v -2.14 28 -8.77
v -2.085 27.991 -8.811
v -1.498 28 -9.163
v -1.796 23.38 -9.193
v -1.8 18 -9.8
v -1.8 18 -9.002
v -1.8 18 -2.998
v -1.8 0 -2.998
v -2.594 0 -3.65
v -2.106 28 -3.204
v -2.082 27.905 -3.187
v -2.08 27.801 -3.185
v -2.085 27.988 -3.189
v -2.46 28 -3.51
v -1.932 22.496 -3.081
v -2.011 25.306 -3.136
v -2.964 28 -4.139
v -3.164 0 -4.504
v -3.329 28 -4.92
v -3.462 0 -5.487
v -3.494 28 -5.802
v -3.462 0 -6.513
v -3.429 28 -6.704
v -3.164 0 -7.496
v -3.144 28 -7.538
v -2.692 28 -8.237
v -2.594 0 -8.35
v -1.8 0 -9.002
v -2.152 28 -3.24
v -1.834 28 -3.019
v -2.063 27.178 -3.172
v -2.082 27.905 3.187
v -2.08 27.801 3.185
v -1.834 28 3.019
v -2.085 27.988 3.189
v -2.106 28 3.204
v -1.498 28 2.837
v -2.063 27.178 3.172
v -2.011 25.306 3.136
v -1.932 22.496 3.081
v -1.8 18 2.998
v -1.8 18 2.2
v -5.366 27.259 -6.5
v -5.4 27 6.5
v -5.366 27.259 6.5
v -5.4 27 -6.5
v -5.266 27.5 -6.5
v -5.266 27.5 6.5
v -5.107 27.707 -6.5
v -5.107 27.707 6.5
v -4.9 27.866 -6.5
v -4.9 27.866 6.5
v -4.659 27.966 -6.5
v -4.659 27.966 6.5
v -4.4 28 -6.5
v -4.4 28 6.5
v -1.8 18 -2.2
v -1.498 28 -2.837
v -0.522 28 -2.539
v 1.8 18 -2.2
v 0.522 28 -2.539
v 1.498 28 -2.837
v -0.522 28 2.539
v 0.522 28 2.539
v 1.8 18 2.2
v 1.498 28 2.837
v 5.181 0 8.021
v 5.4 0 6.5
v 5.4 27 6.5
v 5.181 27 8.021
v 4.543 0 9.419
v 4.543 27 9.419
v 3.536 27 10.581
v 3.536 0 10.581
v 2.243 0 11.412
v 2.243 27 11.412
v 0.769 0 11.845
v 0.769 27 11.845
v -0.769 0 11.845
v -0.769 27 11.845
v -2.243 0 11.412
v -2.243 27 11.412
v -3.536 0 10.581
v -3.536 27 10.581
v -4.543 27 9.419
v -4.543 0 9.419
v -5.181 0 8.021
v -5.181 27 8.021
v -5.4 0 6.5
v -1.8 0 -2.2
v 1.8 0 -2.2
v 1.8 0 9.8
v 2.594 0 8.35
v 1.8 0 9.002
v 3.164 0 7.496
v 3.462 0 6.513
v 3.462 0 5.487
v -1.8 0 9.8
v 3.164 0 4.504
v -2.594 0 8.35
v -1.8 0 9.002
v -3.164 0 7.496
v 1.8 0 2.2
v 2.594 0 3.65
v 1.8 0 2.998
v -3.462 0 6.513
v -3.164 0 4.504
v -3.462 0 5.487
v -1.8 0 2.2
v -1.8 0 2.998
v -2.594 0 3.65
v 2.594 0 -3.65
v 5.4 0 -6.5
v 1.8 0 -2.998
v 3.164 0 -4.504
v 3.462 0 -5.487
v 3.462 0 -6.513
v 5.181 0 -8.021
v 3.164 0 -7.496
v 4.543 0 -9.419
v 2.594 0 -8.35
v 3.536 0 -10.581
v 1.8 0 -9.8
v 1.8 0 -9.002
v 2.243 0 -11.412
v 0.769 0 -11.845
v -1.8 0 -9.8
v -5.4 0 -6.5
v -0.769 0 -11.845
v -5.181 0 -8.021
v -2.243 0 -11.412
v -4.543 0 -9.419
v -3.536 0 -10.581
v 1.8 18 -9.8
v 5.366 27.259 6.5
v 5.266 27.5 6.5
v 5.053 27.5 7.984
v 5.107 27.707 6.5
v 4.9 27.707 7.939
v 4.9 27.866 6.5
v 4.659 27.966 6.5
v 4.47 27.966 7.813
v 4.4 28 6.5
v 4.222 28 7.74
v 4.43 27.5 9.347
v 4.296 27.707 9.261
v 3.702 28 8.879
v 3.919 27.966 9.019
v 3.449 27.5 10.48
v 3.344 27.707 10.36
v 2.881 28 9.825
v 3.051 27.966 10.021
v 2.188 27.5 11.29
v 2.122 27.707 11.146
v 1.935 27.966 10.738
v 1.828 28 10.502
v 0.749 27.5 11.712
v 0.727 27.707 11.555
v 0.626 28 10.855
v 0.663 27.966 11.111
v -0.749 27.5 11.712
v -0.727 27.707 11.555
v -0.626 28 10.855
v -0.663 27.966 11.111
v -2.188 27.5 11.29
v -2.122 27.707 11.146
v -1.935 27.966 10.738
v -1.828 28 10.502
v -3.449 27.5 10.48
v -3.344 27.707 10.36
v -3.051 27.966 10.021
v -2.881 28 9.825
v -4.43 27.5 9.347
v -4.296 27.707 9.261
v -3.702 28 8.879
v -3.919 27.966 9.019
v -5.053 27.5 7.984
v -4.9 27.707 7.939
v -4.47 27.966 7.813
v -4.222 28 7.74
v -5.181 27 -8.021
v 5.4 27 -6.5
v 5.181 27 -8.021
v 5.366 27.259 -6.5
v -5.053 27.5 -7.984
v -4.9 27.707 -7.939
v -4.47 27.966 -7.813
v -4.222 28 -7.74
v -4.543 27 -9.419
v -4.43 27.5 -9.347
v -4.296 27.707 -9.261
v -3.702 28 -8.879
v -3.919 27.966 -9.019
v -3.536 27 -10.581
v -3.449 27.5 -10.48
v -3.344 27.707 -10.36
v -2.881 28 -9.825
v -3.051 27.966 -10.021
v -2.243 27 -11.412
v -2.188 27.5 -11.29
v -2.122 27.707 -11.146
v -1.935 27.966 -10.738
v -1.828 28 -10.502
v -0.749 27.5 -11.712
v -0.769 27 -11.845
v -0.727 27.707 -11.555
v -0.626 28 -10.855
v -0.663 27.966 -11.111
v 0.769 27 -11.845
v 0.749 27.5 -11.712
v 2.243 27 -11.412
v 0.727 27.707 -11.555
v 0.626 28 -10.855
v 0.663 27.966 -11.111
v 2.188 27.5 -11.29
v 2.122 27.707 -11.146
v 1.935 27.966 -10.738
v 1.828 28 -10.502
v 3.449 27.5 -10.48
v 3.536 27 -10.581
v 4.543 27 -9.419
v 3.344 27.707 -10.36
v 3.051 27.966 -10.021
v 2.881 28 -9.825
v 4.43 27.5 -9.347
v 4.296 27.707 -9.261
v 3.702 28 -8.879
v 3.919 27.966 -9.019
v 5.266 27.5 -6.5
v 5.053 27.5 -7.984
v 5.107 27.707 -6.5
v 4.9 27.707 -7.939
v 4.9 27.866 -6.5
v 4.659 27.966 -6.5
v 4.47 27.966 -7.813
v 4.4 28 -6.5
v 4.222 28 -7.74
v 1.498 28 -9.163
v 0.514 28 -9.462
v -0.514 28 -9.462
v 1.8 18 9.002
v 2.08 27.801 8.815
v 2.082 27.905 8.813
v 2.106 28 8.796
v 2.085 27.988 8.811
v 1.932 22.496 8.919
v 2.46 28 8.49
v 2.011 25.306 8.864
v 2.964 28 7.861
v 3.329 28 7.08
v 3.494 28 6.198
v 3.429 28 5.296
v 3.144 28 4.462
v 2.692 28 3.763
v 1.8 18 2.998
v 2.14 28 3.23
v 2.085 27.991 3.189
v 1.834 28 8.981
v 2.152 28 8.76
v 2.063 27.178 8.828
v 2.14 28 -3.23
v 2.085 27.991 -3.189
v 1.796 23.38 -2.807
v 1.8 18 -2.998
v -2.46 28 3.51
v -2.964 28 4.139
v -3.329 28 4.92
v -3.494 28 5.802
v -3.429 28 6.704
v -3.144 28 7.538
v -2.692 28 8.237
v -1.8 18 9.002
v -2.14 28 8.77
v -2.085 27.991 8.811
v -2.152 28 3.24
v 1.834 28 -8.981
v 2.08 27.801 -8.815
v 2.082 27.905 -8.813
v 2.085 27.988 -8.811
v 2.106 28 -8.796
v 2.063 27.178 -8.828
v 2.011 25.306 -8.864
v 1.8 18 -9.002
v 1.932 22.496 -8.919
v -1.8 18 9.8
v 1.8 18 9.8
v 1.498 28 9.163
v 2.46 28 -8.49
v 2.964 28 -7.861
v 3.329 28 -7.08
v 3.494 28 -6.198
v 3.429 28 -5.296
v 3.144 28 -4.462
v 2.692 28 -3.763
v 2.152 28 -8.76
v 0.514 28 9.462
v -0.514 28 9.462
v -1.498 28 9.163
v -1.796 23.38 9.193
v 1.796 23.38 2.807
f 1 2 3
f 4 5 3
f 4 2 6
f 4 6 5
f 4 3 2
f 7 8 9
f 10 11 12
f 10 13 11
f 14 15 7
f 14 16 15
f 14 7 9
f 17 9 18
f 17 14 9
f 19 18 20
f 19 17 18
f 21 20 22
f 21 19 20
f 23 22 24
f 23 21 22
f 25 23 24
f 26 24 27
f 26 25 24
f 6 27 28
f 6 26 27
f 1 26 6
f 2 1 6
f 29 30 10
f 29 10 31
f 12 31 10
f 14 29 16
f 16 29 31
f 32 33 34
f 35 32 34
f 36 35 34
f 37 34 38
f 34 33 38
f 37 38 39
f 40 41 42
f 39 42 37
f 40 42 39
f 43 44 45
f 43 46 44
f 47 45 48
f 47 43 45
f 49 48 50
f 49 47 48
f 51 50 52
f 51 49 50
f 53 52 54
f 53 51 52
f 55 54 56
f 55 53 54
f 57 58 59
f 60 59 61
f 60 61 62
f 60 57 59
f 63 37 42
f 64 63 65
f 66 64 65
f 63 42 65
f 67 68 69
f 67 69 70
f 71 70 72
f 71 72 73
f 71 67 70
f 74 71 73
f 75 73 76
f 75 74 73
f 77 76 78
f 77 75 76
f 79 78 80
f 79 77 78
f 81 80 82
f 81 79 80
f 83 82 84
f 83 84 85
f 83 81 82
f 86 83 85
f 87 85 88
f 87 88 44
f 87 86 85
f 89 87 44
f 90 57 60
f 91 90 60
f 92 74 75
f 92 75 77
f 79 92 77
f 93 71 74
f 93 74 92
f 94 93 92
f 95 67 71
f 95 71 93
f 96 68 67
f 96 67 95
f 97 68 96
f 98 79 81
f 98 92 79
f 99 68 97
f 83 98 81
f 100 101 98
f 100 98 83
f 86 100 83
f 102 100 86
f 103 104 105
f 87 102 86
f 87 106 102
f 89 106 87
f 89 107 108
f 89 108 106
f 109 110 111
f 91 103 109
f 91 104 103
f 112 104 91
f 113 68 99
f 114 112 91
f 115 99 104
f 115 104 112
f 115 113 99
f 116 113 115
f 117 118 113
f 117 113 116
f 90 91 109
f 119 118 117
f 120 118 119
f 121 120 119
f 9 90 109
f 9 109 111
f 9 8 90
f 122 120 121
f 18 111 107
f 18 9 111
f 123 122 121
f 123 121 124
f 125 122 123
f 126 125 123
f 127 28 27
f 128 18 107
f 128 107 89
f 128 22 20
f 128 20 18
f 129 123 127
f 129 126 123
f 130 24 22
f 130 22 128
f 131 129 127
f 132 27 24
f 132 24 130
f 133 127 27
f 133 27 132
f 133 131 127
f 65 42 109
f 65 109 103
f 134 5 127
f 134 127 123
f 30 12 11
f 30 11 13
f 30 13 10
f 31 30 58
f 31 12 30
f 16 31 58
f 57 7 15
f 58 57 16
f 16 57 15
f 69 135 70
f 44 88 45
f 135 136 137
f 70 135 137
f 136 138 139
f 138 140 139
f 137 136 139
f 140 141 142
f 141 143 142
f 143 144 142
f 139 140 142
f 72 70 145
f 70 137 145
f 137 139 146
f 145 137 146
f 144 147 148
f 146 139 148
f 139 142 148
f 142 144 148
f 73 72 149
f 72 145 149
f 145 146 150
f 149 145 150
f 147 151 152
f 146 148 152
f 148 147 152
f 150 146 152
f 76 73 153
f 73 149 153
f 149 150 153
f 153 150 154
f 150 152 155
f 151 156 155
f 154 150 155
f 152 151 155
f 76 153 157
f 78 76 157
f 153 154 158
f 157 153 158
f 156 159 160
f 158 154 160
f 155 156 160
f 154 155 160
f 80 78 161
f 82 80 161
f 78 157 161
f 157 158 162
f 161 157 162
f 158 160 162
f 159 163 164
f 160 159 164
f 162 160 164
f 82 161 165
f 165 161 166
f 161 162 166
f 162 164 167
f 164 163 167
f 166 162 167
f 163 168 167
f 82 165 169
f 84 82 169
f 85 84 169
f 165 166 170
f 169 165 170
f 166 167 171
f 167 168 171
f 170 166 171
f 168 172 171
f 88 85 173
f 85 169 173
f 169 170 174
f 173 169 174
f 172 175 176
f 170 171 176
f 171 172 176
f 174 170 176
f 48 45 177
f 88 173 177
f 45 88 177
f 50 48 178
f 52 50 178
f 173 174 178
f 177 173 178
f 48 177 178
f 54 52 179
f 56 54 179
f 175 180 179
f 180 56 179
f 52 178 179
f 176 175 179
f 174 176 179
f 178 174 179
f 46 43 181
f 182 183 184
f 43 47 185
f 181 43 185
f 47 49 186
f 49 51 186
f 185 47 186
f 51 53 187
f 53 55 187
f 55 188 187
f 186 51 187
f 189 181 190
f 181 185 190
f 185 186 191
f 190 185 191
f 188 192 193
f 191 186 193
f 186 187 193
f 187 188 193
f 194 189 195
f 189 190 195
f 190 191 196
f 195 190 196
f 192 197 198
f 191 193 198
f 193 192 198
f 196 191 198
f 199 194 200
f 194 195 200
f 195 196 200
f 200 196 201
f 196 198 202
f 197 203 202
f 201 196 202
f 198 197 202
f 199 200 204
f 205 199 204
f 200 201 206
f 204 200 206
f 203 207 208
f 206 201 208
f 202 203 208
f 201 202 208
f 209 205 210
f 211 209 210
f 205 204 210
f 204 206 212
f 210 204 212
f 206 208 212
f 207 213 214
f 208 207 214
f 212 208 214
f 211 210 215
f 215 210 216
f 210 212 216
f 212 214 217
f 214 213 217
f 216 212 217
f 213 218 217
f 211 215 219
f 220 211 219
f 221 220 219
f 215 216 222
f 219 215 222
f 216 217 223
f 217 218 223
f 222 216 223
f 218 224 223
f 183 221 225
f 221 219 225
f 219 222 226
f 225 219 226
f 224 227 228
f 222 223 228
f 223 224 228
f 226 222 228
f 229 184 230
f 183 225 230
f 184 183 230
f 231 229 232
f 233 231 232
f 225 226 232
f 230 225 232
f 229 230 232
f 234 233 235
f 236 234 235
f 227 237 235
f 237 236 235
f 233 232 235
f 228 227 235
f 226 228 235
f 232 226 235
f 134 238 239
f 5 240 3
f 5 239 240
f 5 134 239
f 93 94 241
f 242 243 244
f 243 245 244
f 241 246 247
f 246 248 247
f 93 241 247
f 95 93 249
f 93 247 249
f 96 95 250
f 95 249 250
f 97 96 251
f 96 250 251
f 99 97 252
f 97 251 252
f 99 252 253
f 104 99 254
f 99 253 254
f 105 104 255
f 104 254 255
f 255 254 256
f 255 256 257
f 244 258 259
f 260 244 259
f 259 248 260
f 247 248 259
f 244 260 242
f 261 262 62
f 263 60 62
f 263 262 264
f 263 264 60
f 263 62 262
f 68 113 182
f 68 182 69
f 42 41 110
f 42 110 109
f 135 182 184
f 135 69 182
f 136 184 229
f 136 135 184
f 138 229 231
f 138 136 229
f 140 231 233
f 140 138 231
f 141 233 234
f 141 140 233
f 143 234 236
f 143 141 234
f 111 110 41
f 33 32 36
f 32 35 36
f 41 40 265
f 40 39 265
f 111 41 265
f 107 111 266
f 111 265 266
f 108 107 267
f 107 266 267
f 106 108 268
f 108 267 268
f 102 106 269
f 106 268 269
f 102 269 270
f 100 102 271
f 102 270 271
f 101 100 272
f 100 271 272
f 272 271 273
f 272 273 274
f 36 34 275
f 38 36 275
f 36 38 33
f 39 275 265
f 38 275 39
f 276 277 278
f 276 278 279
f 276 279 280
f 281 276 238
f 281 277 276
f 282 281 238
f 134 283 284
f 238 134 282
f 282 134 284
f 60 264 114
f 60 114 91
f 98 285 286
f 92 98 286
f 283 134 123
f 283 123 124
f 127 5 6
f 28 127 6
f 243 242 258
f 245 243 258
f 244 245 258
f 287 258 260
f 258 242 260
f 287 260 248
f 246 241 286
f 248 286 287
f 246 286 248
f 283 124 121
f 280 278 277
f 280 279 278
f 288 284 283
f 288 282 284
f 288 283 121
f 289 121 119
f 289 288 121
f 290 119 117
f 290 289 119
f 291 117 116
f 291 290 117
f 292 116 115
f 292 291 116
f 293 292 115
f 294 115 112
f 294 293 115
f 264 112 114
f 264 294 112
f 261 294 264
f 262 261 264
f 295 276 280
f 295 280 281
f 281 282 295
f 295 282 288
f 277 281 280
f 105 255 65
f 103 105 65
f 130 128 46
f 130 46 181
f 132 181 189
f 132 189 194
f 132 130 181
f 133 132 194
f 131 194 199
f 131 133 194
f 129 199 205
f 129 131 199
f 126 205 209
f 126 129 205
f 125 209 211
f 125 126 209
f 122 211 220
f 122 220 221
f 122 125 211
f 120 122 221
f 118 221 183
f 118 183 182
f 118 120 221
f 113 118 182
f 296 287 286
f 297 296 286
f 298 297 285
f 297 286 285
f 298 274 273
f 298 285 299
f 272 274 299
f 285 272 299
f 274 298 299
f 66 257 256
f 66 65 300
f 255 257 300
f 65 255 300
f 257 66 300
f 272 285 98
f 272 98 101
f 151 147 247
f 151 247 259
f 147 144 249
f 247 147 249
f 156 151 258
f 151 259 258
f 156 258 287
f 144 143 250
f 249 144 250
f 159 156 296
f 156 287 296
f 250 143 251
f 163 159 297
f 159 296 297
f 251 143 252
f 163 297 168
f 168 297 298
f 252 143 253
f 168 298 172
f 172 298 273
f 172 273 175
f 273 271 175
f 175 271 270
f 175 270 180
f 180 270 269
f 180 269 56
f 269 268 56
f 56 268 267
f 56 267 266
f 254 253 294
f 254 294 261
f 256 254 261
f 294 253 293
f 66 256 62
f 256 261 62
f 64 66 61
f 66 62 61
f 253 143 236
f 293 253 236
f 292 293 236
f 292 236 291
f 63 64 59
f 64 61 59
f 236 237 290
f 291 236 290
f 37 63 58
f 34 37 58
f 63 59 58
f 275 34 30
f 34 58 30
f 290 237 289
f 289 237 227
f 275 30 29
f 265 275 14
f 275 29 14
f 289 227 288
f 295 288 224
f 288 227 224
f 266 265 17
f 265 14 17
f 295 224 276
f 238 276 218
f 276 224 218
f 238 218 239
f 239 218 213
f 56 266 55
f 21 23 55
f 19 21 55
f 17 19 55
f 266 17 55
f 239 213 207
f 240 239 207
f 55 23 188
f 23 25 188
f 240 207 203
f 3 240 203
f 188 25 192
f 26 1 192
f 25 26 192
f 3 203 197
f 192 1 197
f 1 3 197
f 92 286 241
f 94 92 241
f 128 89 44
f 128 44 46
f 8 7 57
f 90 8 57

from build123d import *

# Parameters (mm, degrees)
BOSS_EXTRU_1_DEPTH      = 28
CONG_2_R                = 1
ESQUISSE3_R             = 3.5
ENL_V_MAT_EXTRU_3_DEPTH = 31.8993528
ESQUISSE6_W             = 3.6
ESQUISSE6_H             = 7.6
ENL_V_MAT_EXTRU_4_DEPTH = 23.243426154


with BuildPart() as part:
    # Esquisse1 → Boss.-Extru.1 (new body)
    with BuildSketch(Plane(origin=(0, 0, 0), x_dir=(1, 0, 0), z_dir=(0, 1, 0))):
        with BuildLine():
            Line((5.4, 6.5), (5.4, -6.5))
            ThreePointArc((5.4, -6.5), (0, -11.9), (-5.4, -6.5))
            Line((-5.4, -6.5), (-5.4, 6.5))
            ThreePointArc((-5.4, 6.5), (0, 11.9), (5.4, 6.5))
        make_face()
    extrude(amount=BOSS_EXTRU_1_DEPTH)

    # Congé2
    cong_2_edges = [part.edges().sort_by_distance(p)[0] for p in [
        (0, 28, 11.9),
        (5.4, 28, 0),
        (0, 28, -11.9),
        (-5.4, 28, 0),
    ]]
    fillet(cong_2_edges, radius=CONG_2_R)

    # Esquisse3 → Enlèv. mat.-Extru.3 (cut, through all)
    with BuildSketch(Plane(origin=(0, 28, 0), x_dir=(1, 0, 0), z_dir=(0, 1, 0))):
        with Locations(Location((0, -6, 0), (0, 0, 270))):
            Circle(ESQUISSE3_R)
    enl_v_mat_extru_3 = extrude(amount=-ENL_V_MAT_EXTRU_3_DEPTH, mode=Mode.SUBTRACT)

    # Esquisse5 for Enl_vement d → Enlèvement de matière-Lissage1 section 0
    with BuildSketch(Plane(origin=(0, 28, 0), x_dir=(1, 0, 0), z_dir=(0, 1, 0))):
        with BuildLine():
            # circular arc as an exact rational Bezier (weights 1, cos(half-angle), 1)
            Bezier((-1.498302207, -2.836917564), (0, -2.127195466), (1.498302207, -2.836917564), weights=[1, 0.903737839, 1])
            Bezier((1.498302207, -2.836917564), (8.17592068, -6), (1.498302207, -9.163082436), weights=[1, 0.428086345, 1])
            Bezier((1.498302207, -9.163082436), (0, -9.872804534), (-1.498302207, -9.163082436), weights=[1, 0.903737839, 1])
            Bezier((-1.498302207, -9.163082436), (-8.17592068, -6), (-1.498302207, -2.836917564), weights=[1, 0.428086345, 1])
        make_face()
    # Esquisse4 → Enlèvement de matière-Lissage1 section 1
    with BuildSketch(Plane(origin=(0, 18, 0), x_dir=(1, 0, 0), z_dir=(0, 1, 0))):
        with BuildLine():
            Line((-1.8, -2.2), (1.8, -2.2))
            Line((1.8, -2.2), (1.8, -9.8))
            Line((1.8, -9.8), (-1.8, -9.8))
            Line((-1.8, -9.8), (-1.8, -2.2))
        make_face()
    enl_vement_de_mati_re_lissage1 = loft(mode=Mode.SUBTRACT)

    # Esquisse6 → Enlèv. mat.-Extru.4 (cut, through all)
    with BuildSketch(Plane(origin=(0, 18, 0), x_dir=(1, 0, 0), z_dir=(0, 1, 0))):
        with Locations((0, -6)):
            Rectangle(ESQUISSE6_W, ESQUISSE6_H)
    enl_v_mat_extru_4 = extrude(amount=-ENL_V_MAT_EXTRU_4_DEPTH, mode=Mode.SUBTRACT)

    # Symétrie1: Enlèv. mat.-Extru.3, Enlèvement de matière-Lissage1, Enlèv. mat.-Extru.4 across plane
    add(enl_v_mat_extru_3.mirror(Plane.XY), mode=Mode.SUBTRACT)
    add(enl_vement_de_mati_re_lissage1.mirror(Plane.XY), mode=Mode.SUBTRACT)
    add(enl_v_mat_extru_4.mirror(Plane.XY), mode=Mode.SUBTRACT)


solid = part.part
